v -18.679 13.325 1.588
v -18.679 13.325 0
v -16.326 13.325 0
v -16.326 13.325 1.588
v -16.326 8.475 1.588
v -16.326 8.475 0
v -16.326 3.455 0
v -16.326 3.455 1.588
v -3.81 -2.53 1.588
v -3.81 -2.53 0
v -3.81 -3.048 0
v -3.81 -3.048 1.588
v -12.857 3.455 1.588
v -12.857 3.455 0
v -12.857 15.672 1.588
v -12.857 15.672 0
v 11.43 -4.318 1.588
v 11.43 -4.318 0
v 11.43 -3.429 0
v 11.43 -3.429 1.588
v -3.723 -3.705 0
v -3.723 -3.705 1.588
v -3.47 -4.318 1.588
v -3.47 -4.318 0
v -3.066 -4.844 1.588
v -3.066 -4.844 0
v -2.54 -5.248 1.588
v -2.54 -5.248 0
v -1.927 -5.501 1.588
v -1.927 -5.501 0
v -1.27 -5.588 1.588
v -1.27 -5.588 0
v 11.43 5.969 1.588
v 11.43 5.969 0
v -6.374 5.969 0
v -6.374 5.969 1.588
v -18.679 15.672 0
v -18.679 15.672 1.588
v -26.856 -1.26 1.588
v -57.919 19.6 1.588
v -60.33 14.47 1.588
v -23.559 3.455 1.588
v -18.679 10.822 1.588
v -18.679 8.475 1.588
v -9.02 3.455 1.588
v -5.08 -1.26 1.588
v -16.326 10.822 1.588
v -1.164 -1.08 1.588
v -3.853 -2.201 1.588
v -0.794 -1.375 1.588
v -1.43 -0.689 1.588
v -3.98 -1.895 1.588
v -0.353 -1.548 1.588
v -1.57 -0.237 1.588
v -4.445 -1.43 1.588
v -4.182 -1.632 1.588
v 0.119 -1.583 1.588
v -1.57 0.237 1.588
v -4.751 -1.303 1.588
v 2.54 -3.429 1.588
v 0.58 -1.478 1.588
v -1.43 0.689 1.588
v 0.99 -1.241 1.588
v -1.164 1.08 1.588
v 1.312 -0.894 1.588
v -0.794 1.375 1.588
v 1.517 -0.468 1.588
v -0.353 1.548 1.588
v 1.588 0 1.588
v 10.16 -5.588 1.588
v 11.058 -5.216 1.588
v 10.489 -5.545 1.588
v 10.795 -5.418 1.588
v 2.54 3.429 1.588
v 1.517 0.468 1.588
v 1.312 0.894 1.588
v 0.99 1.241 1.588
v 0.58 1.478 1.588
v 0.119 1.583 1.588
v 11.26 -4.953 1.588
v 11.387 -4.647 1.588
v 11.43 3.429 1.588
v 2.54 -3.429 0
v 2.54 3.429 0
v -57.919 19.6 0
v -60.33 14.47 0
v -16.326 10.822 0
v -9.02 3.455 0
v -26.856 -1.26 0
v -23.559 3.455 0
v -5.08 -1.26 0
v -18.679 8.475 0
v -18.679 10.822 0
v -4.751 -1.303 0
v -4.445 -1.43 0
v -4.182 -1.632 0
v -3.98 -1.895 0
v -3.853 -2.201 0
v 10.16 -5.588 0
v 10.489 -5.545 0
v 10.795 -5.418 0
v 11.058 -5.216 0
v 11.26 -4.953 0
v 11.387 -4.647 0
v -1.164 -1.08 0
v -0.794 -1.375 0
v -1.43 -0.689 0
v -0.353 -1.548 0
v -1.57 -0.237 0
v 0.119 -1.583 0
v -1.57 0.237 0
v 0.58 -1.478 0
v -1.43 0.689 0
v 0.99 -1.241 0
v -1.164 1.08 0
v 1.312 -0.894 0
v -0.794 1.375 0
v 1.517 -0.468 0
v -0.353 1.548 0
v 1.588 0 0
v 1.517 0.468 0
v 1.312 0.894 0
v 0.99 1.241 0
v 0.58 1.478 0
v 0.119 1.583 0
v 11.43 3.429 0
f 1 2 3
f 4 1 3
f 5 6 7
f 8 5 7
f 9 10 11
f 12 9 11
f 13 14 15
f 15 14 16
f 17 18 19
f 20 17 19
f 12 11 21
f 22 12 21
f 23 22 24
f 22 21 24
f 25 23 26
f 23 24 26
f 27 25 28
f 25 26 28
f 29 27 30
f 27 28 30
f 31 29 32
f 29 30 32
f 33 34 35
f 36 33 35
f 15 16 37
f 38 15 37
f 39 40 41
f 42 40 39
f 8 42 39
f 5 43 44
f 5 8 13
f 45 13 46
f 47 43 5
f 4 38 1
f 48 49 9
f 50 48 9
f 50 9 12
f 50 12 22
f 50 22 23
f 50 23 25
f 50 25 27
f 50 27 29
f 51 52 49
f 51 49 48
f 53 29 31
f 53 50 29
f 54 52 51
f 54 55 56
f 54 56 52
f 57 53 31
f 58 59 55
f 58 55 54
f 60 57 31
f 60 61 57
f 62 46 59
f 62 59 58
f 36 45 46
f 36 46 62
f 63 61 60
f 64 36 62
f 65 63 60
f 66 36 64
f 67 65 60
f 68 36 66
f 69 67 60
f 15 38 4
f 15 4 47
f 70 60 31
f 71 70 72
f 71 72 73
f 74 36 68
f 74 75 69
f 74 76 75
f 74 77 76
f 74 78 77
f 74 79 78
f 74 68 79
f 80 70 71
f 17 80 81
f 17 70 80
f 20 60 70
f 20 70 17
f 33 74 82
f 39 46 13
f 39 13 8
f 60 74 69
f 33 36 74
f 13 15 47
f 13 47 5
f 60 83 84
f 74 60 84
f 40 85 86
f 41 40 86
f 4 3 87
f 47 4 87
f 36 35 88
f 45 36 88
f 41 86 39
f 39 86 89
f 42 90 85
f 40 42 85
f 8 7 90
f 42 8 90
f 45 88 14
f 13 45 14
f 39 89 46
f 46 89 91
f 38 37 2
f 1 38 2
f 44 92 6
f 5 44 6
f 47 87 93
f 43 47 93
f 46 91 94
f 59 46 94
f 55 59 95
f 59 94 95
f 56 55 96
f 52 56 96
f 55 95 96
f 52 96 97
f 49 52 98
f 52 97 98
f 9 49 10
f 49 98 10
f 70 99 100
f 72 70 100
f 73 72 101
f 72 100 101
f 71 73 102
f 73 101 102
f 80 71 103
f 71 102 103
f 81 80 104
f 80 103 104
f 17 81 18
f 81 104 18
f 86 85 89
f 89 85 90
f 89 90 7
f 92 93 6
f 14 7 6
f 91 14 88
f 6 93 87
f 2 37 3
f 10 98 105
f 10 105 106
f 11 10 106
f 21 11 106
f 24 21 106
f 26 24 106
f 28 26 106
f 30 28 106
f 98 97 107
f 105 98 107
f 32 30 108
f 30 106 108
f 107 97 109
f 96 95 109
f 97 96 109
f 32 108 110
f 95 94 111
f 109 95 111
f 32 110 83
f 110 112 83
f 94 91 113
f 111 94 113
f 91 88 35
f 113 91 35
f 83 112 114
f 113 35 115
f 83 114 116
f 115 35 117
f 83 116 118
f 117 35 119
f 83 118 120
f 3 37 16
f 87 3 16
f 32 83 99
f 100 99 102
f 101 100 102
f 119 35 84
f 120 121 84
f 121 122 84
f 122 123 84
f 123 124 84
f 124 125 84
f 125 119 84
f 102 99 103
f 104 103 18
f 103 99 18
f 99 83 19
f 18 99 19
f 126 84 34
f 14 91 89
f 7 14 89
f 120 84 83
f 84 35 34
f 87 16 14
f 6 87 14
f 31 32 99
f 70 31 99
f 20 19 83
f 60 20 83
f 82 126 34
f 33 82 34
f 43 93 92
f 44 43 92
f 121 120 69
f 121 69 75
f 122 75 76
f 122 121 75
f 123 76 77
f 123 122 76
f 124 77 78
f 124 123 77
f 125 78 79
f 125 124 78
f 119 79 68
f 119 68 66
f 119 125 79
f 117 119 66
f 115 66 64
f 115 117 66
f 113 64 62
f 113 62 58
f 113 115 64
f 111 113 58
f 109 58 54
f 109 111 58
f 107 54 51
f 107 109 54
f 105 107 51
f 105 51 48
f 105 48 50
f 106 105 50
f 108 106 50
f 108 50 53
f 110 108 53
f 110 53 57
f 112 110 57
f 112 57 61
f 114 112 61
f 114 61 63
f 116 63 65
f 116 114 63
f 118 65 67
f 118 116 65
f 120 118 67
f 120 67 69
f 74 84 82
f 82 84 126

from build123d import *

# Parameters (mm, degrees)
SKETCH1_R           = 1.5875
BOSS_EXTRUDE1_DEPTH = 1.5875


with BuildPart() as part:
    # Sketch1 → Boss-Extrude1 (new body)
    with BuildSketch(Plane.XY):
        with BuildLine():
            Line((-16.325816956, 3.455164033), (-23.558913278, 3.455164033))
            Line((-23.558913278, 3.455164033), (-57.919477855, 19.600489558))
            Line((-57.919477855, 19.600489558), (-60.33041288, 14.469525274))
            Line((-60.33041288, 14.469525274), (-26.855616668, -1.259595838))
            Line((-26.855616668, -1.259595838), (-5.08, -1.259595838))
            ThreePointArc((-5.08, -1.259595838), (-4.181974388, -1.631570226), (-3.81, -2.529595838))
            Line((-3.81, -2.529595838), (-3.81, -3.048))
            ThreePointArc((-3.81, -3.048), (-3.066051224, -4.844051224), (-1.27, -5.588))
            Line((-1.27, -5.588), (10.16, -5.588))
            ThreePointArc((10.16, -5.588), (11.058025612, -5.216025612), (11.43, -4.318))
            Line((11.43, -4.318), (11.43, -3.429))
            Line((11.43, -3.429), (2.54, -3.429))
            Line((2.54, -3.429), (2.54, 3.429))
            Line((2.54, 3.429), (11.43, 3.429))
            Line((11.43, 3.429), (11.43, 5.969))
            Line((11.43, 5.969), (-6.374321652, 5.969))
            Line((-6.374321652, 5.969), (-9.020464775, 3.455164033))
            Line((-9.020464775, 3.455164033), (-12.857372303, 3.455164033))
            Line((-12.857372303, 3.455164033), (-12.857372303, 15.672353851))
            Line((-12.857372303, 15.672353851), (-18.678887174, 15.672353851))
            Line((-18.678887174, 15.672353851), (-18.678887174, 13.324716524))
            Line((-18.678887174, 13.324716524), (-16.325816956, 13.324716524))
            Line((-16.325816956, 13.324716524), (-16.325816956, 10.822176612))
            Line((-16.325816956, 10.822176612), (-18.678887174, 10.822176612))
            Line((-18.678887174, 10.822176612), (-18.678887174, 8.474539284))
            Line((-18.678887174, 8.474539284), (-16.325816956, 8.474539284))
            Line((-16.325816956, 8.474539284), (-16.325816956, 3.455164033))
        make_face()
        Circle(SKETCH1_R, mode=Mode.SUBTRACT)
    extrude(amount=BOSS_EXTRUDE1_DEPTH)


solid = part.part
